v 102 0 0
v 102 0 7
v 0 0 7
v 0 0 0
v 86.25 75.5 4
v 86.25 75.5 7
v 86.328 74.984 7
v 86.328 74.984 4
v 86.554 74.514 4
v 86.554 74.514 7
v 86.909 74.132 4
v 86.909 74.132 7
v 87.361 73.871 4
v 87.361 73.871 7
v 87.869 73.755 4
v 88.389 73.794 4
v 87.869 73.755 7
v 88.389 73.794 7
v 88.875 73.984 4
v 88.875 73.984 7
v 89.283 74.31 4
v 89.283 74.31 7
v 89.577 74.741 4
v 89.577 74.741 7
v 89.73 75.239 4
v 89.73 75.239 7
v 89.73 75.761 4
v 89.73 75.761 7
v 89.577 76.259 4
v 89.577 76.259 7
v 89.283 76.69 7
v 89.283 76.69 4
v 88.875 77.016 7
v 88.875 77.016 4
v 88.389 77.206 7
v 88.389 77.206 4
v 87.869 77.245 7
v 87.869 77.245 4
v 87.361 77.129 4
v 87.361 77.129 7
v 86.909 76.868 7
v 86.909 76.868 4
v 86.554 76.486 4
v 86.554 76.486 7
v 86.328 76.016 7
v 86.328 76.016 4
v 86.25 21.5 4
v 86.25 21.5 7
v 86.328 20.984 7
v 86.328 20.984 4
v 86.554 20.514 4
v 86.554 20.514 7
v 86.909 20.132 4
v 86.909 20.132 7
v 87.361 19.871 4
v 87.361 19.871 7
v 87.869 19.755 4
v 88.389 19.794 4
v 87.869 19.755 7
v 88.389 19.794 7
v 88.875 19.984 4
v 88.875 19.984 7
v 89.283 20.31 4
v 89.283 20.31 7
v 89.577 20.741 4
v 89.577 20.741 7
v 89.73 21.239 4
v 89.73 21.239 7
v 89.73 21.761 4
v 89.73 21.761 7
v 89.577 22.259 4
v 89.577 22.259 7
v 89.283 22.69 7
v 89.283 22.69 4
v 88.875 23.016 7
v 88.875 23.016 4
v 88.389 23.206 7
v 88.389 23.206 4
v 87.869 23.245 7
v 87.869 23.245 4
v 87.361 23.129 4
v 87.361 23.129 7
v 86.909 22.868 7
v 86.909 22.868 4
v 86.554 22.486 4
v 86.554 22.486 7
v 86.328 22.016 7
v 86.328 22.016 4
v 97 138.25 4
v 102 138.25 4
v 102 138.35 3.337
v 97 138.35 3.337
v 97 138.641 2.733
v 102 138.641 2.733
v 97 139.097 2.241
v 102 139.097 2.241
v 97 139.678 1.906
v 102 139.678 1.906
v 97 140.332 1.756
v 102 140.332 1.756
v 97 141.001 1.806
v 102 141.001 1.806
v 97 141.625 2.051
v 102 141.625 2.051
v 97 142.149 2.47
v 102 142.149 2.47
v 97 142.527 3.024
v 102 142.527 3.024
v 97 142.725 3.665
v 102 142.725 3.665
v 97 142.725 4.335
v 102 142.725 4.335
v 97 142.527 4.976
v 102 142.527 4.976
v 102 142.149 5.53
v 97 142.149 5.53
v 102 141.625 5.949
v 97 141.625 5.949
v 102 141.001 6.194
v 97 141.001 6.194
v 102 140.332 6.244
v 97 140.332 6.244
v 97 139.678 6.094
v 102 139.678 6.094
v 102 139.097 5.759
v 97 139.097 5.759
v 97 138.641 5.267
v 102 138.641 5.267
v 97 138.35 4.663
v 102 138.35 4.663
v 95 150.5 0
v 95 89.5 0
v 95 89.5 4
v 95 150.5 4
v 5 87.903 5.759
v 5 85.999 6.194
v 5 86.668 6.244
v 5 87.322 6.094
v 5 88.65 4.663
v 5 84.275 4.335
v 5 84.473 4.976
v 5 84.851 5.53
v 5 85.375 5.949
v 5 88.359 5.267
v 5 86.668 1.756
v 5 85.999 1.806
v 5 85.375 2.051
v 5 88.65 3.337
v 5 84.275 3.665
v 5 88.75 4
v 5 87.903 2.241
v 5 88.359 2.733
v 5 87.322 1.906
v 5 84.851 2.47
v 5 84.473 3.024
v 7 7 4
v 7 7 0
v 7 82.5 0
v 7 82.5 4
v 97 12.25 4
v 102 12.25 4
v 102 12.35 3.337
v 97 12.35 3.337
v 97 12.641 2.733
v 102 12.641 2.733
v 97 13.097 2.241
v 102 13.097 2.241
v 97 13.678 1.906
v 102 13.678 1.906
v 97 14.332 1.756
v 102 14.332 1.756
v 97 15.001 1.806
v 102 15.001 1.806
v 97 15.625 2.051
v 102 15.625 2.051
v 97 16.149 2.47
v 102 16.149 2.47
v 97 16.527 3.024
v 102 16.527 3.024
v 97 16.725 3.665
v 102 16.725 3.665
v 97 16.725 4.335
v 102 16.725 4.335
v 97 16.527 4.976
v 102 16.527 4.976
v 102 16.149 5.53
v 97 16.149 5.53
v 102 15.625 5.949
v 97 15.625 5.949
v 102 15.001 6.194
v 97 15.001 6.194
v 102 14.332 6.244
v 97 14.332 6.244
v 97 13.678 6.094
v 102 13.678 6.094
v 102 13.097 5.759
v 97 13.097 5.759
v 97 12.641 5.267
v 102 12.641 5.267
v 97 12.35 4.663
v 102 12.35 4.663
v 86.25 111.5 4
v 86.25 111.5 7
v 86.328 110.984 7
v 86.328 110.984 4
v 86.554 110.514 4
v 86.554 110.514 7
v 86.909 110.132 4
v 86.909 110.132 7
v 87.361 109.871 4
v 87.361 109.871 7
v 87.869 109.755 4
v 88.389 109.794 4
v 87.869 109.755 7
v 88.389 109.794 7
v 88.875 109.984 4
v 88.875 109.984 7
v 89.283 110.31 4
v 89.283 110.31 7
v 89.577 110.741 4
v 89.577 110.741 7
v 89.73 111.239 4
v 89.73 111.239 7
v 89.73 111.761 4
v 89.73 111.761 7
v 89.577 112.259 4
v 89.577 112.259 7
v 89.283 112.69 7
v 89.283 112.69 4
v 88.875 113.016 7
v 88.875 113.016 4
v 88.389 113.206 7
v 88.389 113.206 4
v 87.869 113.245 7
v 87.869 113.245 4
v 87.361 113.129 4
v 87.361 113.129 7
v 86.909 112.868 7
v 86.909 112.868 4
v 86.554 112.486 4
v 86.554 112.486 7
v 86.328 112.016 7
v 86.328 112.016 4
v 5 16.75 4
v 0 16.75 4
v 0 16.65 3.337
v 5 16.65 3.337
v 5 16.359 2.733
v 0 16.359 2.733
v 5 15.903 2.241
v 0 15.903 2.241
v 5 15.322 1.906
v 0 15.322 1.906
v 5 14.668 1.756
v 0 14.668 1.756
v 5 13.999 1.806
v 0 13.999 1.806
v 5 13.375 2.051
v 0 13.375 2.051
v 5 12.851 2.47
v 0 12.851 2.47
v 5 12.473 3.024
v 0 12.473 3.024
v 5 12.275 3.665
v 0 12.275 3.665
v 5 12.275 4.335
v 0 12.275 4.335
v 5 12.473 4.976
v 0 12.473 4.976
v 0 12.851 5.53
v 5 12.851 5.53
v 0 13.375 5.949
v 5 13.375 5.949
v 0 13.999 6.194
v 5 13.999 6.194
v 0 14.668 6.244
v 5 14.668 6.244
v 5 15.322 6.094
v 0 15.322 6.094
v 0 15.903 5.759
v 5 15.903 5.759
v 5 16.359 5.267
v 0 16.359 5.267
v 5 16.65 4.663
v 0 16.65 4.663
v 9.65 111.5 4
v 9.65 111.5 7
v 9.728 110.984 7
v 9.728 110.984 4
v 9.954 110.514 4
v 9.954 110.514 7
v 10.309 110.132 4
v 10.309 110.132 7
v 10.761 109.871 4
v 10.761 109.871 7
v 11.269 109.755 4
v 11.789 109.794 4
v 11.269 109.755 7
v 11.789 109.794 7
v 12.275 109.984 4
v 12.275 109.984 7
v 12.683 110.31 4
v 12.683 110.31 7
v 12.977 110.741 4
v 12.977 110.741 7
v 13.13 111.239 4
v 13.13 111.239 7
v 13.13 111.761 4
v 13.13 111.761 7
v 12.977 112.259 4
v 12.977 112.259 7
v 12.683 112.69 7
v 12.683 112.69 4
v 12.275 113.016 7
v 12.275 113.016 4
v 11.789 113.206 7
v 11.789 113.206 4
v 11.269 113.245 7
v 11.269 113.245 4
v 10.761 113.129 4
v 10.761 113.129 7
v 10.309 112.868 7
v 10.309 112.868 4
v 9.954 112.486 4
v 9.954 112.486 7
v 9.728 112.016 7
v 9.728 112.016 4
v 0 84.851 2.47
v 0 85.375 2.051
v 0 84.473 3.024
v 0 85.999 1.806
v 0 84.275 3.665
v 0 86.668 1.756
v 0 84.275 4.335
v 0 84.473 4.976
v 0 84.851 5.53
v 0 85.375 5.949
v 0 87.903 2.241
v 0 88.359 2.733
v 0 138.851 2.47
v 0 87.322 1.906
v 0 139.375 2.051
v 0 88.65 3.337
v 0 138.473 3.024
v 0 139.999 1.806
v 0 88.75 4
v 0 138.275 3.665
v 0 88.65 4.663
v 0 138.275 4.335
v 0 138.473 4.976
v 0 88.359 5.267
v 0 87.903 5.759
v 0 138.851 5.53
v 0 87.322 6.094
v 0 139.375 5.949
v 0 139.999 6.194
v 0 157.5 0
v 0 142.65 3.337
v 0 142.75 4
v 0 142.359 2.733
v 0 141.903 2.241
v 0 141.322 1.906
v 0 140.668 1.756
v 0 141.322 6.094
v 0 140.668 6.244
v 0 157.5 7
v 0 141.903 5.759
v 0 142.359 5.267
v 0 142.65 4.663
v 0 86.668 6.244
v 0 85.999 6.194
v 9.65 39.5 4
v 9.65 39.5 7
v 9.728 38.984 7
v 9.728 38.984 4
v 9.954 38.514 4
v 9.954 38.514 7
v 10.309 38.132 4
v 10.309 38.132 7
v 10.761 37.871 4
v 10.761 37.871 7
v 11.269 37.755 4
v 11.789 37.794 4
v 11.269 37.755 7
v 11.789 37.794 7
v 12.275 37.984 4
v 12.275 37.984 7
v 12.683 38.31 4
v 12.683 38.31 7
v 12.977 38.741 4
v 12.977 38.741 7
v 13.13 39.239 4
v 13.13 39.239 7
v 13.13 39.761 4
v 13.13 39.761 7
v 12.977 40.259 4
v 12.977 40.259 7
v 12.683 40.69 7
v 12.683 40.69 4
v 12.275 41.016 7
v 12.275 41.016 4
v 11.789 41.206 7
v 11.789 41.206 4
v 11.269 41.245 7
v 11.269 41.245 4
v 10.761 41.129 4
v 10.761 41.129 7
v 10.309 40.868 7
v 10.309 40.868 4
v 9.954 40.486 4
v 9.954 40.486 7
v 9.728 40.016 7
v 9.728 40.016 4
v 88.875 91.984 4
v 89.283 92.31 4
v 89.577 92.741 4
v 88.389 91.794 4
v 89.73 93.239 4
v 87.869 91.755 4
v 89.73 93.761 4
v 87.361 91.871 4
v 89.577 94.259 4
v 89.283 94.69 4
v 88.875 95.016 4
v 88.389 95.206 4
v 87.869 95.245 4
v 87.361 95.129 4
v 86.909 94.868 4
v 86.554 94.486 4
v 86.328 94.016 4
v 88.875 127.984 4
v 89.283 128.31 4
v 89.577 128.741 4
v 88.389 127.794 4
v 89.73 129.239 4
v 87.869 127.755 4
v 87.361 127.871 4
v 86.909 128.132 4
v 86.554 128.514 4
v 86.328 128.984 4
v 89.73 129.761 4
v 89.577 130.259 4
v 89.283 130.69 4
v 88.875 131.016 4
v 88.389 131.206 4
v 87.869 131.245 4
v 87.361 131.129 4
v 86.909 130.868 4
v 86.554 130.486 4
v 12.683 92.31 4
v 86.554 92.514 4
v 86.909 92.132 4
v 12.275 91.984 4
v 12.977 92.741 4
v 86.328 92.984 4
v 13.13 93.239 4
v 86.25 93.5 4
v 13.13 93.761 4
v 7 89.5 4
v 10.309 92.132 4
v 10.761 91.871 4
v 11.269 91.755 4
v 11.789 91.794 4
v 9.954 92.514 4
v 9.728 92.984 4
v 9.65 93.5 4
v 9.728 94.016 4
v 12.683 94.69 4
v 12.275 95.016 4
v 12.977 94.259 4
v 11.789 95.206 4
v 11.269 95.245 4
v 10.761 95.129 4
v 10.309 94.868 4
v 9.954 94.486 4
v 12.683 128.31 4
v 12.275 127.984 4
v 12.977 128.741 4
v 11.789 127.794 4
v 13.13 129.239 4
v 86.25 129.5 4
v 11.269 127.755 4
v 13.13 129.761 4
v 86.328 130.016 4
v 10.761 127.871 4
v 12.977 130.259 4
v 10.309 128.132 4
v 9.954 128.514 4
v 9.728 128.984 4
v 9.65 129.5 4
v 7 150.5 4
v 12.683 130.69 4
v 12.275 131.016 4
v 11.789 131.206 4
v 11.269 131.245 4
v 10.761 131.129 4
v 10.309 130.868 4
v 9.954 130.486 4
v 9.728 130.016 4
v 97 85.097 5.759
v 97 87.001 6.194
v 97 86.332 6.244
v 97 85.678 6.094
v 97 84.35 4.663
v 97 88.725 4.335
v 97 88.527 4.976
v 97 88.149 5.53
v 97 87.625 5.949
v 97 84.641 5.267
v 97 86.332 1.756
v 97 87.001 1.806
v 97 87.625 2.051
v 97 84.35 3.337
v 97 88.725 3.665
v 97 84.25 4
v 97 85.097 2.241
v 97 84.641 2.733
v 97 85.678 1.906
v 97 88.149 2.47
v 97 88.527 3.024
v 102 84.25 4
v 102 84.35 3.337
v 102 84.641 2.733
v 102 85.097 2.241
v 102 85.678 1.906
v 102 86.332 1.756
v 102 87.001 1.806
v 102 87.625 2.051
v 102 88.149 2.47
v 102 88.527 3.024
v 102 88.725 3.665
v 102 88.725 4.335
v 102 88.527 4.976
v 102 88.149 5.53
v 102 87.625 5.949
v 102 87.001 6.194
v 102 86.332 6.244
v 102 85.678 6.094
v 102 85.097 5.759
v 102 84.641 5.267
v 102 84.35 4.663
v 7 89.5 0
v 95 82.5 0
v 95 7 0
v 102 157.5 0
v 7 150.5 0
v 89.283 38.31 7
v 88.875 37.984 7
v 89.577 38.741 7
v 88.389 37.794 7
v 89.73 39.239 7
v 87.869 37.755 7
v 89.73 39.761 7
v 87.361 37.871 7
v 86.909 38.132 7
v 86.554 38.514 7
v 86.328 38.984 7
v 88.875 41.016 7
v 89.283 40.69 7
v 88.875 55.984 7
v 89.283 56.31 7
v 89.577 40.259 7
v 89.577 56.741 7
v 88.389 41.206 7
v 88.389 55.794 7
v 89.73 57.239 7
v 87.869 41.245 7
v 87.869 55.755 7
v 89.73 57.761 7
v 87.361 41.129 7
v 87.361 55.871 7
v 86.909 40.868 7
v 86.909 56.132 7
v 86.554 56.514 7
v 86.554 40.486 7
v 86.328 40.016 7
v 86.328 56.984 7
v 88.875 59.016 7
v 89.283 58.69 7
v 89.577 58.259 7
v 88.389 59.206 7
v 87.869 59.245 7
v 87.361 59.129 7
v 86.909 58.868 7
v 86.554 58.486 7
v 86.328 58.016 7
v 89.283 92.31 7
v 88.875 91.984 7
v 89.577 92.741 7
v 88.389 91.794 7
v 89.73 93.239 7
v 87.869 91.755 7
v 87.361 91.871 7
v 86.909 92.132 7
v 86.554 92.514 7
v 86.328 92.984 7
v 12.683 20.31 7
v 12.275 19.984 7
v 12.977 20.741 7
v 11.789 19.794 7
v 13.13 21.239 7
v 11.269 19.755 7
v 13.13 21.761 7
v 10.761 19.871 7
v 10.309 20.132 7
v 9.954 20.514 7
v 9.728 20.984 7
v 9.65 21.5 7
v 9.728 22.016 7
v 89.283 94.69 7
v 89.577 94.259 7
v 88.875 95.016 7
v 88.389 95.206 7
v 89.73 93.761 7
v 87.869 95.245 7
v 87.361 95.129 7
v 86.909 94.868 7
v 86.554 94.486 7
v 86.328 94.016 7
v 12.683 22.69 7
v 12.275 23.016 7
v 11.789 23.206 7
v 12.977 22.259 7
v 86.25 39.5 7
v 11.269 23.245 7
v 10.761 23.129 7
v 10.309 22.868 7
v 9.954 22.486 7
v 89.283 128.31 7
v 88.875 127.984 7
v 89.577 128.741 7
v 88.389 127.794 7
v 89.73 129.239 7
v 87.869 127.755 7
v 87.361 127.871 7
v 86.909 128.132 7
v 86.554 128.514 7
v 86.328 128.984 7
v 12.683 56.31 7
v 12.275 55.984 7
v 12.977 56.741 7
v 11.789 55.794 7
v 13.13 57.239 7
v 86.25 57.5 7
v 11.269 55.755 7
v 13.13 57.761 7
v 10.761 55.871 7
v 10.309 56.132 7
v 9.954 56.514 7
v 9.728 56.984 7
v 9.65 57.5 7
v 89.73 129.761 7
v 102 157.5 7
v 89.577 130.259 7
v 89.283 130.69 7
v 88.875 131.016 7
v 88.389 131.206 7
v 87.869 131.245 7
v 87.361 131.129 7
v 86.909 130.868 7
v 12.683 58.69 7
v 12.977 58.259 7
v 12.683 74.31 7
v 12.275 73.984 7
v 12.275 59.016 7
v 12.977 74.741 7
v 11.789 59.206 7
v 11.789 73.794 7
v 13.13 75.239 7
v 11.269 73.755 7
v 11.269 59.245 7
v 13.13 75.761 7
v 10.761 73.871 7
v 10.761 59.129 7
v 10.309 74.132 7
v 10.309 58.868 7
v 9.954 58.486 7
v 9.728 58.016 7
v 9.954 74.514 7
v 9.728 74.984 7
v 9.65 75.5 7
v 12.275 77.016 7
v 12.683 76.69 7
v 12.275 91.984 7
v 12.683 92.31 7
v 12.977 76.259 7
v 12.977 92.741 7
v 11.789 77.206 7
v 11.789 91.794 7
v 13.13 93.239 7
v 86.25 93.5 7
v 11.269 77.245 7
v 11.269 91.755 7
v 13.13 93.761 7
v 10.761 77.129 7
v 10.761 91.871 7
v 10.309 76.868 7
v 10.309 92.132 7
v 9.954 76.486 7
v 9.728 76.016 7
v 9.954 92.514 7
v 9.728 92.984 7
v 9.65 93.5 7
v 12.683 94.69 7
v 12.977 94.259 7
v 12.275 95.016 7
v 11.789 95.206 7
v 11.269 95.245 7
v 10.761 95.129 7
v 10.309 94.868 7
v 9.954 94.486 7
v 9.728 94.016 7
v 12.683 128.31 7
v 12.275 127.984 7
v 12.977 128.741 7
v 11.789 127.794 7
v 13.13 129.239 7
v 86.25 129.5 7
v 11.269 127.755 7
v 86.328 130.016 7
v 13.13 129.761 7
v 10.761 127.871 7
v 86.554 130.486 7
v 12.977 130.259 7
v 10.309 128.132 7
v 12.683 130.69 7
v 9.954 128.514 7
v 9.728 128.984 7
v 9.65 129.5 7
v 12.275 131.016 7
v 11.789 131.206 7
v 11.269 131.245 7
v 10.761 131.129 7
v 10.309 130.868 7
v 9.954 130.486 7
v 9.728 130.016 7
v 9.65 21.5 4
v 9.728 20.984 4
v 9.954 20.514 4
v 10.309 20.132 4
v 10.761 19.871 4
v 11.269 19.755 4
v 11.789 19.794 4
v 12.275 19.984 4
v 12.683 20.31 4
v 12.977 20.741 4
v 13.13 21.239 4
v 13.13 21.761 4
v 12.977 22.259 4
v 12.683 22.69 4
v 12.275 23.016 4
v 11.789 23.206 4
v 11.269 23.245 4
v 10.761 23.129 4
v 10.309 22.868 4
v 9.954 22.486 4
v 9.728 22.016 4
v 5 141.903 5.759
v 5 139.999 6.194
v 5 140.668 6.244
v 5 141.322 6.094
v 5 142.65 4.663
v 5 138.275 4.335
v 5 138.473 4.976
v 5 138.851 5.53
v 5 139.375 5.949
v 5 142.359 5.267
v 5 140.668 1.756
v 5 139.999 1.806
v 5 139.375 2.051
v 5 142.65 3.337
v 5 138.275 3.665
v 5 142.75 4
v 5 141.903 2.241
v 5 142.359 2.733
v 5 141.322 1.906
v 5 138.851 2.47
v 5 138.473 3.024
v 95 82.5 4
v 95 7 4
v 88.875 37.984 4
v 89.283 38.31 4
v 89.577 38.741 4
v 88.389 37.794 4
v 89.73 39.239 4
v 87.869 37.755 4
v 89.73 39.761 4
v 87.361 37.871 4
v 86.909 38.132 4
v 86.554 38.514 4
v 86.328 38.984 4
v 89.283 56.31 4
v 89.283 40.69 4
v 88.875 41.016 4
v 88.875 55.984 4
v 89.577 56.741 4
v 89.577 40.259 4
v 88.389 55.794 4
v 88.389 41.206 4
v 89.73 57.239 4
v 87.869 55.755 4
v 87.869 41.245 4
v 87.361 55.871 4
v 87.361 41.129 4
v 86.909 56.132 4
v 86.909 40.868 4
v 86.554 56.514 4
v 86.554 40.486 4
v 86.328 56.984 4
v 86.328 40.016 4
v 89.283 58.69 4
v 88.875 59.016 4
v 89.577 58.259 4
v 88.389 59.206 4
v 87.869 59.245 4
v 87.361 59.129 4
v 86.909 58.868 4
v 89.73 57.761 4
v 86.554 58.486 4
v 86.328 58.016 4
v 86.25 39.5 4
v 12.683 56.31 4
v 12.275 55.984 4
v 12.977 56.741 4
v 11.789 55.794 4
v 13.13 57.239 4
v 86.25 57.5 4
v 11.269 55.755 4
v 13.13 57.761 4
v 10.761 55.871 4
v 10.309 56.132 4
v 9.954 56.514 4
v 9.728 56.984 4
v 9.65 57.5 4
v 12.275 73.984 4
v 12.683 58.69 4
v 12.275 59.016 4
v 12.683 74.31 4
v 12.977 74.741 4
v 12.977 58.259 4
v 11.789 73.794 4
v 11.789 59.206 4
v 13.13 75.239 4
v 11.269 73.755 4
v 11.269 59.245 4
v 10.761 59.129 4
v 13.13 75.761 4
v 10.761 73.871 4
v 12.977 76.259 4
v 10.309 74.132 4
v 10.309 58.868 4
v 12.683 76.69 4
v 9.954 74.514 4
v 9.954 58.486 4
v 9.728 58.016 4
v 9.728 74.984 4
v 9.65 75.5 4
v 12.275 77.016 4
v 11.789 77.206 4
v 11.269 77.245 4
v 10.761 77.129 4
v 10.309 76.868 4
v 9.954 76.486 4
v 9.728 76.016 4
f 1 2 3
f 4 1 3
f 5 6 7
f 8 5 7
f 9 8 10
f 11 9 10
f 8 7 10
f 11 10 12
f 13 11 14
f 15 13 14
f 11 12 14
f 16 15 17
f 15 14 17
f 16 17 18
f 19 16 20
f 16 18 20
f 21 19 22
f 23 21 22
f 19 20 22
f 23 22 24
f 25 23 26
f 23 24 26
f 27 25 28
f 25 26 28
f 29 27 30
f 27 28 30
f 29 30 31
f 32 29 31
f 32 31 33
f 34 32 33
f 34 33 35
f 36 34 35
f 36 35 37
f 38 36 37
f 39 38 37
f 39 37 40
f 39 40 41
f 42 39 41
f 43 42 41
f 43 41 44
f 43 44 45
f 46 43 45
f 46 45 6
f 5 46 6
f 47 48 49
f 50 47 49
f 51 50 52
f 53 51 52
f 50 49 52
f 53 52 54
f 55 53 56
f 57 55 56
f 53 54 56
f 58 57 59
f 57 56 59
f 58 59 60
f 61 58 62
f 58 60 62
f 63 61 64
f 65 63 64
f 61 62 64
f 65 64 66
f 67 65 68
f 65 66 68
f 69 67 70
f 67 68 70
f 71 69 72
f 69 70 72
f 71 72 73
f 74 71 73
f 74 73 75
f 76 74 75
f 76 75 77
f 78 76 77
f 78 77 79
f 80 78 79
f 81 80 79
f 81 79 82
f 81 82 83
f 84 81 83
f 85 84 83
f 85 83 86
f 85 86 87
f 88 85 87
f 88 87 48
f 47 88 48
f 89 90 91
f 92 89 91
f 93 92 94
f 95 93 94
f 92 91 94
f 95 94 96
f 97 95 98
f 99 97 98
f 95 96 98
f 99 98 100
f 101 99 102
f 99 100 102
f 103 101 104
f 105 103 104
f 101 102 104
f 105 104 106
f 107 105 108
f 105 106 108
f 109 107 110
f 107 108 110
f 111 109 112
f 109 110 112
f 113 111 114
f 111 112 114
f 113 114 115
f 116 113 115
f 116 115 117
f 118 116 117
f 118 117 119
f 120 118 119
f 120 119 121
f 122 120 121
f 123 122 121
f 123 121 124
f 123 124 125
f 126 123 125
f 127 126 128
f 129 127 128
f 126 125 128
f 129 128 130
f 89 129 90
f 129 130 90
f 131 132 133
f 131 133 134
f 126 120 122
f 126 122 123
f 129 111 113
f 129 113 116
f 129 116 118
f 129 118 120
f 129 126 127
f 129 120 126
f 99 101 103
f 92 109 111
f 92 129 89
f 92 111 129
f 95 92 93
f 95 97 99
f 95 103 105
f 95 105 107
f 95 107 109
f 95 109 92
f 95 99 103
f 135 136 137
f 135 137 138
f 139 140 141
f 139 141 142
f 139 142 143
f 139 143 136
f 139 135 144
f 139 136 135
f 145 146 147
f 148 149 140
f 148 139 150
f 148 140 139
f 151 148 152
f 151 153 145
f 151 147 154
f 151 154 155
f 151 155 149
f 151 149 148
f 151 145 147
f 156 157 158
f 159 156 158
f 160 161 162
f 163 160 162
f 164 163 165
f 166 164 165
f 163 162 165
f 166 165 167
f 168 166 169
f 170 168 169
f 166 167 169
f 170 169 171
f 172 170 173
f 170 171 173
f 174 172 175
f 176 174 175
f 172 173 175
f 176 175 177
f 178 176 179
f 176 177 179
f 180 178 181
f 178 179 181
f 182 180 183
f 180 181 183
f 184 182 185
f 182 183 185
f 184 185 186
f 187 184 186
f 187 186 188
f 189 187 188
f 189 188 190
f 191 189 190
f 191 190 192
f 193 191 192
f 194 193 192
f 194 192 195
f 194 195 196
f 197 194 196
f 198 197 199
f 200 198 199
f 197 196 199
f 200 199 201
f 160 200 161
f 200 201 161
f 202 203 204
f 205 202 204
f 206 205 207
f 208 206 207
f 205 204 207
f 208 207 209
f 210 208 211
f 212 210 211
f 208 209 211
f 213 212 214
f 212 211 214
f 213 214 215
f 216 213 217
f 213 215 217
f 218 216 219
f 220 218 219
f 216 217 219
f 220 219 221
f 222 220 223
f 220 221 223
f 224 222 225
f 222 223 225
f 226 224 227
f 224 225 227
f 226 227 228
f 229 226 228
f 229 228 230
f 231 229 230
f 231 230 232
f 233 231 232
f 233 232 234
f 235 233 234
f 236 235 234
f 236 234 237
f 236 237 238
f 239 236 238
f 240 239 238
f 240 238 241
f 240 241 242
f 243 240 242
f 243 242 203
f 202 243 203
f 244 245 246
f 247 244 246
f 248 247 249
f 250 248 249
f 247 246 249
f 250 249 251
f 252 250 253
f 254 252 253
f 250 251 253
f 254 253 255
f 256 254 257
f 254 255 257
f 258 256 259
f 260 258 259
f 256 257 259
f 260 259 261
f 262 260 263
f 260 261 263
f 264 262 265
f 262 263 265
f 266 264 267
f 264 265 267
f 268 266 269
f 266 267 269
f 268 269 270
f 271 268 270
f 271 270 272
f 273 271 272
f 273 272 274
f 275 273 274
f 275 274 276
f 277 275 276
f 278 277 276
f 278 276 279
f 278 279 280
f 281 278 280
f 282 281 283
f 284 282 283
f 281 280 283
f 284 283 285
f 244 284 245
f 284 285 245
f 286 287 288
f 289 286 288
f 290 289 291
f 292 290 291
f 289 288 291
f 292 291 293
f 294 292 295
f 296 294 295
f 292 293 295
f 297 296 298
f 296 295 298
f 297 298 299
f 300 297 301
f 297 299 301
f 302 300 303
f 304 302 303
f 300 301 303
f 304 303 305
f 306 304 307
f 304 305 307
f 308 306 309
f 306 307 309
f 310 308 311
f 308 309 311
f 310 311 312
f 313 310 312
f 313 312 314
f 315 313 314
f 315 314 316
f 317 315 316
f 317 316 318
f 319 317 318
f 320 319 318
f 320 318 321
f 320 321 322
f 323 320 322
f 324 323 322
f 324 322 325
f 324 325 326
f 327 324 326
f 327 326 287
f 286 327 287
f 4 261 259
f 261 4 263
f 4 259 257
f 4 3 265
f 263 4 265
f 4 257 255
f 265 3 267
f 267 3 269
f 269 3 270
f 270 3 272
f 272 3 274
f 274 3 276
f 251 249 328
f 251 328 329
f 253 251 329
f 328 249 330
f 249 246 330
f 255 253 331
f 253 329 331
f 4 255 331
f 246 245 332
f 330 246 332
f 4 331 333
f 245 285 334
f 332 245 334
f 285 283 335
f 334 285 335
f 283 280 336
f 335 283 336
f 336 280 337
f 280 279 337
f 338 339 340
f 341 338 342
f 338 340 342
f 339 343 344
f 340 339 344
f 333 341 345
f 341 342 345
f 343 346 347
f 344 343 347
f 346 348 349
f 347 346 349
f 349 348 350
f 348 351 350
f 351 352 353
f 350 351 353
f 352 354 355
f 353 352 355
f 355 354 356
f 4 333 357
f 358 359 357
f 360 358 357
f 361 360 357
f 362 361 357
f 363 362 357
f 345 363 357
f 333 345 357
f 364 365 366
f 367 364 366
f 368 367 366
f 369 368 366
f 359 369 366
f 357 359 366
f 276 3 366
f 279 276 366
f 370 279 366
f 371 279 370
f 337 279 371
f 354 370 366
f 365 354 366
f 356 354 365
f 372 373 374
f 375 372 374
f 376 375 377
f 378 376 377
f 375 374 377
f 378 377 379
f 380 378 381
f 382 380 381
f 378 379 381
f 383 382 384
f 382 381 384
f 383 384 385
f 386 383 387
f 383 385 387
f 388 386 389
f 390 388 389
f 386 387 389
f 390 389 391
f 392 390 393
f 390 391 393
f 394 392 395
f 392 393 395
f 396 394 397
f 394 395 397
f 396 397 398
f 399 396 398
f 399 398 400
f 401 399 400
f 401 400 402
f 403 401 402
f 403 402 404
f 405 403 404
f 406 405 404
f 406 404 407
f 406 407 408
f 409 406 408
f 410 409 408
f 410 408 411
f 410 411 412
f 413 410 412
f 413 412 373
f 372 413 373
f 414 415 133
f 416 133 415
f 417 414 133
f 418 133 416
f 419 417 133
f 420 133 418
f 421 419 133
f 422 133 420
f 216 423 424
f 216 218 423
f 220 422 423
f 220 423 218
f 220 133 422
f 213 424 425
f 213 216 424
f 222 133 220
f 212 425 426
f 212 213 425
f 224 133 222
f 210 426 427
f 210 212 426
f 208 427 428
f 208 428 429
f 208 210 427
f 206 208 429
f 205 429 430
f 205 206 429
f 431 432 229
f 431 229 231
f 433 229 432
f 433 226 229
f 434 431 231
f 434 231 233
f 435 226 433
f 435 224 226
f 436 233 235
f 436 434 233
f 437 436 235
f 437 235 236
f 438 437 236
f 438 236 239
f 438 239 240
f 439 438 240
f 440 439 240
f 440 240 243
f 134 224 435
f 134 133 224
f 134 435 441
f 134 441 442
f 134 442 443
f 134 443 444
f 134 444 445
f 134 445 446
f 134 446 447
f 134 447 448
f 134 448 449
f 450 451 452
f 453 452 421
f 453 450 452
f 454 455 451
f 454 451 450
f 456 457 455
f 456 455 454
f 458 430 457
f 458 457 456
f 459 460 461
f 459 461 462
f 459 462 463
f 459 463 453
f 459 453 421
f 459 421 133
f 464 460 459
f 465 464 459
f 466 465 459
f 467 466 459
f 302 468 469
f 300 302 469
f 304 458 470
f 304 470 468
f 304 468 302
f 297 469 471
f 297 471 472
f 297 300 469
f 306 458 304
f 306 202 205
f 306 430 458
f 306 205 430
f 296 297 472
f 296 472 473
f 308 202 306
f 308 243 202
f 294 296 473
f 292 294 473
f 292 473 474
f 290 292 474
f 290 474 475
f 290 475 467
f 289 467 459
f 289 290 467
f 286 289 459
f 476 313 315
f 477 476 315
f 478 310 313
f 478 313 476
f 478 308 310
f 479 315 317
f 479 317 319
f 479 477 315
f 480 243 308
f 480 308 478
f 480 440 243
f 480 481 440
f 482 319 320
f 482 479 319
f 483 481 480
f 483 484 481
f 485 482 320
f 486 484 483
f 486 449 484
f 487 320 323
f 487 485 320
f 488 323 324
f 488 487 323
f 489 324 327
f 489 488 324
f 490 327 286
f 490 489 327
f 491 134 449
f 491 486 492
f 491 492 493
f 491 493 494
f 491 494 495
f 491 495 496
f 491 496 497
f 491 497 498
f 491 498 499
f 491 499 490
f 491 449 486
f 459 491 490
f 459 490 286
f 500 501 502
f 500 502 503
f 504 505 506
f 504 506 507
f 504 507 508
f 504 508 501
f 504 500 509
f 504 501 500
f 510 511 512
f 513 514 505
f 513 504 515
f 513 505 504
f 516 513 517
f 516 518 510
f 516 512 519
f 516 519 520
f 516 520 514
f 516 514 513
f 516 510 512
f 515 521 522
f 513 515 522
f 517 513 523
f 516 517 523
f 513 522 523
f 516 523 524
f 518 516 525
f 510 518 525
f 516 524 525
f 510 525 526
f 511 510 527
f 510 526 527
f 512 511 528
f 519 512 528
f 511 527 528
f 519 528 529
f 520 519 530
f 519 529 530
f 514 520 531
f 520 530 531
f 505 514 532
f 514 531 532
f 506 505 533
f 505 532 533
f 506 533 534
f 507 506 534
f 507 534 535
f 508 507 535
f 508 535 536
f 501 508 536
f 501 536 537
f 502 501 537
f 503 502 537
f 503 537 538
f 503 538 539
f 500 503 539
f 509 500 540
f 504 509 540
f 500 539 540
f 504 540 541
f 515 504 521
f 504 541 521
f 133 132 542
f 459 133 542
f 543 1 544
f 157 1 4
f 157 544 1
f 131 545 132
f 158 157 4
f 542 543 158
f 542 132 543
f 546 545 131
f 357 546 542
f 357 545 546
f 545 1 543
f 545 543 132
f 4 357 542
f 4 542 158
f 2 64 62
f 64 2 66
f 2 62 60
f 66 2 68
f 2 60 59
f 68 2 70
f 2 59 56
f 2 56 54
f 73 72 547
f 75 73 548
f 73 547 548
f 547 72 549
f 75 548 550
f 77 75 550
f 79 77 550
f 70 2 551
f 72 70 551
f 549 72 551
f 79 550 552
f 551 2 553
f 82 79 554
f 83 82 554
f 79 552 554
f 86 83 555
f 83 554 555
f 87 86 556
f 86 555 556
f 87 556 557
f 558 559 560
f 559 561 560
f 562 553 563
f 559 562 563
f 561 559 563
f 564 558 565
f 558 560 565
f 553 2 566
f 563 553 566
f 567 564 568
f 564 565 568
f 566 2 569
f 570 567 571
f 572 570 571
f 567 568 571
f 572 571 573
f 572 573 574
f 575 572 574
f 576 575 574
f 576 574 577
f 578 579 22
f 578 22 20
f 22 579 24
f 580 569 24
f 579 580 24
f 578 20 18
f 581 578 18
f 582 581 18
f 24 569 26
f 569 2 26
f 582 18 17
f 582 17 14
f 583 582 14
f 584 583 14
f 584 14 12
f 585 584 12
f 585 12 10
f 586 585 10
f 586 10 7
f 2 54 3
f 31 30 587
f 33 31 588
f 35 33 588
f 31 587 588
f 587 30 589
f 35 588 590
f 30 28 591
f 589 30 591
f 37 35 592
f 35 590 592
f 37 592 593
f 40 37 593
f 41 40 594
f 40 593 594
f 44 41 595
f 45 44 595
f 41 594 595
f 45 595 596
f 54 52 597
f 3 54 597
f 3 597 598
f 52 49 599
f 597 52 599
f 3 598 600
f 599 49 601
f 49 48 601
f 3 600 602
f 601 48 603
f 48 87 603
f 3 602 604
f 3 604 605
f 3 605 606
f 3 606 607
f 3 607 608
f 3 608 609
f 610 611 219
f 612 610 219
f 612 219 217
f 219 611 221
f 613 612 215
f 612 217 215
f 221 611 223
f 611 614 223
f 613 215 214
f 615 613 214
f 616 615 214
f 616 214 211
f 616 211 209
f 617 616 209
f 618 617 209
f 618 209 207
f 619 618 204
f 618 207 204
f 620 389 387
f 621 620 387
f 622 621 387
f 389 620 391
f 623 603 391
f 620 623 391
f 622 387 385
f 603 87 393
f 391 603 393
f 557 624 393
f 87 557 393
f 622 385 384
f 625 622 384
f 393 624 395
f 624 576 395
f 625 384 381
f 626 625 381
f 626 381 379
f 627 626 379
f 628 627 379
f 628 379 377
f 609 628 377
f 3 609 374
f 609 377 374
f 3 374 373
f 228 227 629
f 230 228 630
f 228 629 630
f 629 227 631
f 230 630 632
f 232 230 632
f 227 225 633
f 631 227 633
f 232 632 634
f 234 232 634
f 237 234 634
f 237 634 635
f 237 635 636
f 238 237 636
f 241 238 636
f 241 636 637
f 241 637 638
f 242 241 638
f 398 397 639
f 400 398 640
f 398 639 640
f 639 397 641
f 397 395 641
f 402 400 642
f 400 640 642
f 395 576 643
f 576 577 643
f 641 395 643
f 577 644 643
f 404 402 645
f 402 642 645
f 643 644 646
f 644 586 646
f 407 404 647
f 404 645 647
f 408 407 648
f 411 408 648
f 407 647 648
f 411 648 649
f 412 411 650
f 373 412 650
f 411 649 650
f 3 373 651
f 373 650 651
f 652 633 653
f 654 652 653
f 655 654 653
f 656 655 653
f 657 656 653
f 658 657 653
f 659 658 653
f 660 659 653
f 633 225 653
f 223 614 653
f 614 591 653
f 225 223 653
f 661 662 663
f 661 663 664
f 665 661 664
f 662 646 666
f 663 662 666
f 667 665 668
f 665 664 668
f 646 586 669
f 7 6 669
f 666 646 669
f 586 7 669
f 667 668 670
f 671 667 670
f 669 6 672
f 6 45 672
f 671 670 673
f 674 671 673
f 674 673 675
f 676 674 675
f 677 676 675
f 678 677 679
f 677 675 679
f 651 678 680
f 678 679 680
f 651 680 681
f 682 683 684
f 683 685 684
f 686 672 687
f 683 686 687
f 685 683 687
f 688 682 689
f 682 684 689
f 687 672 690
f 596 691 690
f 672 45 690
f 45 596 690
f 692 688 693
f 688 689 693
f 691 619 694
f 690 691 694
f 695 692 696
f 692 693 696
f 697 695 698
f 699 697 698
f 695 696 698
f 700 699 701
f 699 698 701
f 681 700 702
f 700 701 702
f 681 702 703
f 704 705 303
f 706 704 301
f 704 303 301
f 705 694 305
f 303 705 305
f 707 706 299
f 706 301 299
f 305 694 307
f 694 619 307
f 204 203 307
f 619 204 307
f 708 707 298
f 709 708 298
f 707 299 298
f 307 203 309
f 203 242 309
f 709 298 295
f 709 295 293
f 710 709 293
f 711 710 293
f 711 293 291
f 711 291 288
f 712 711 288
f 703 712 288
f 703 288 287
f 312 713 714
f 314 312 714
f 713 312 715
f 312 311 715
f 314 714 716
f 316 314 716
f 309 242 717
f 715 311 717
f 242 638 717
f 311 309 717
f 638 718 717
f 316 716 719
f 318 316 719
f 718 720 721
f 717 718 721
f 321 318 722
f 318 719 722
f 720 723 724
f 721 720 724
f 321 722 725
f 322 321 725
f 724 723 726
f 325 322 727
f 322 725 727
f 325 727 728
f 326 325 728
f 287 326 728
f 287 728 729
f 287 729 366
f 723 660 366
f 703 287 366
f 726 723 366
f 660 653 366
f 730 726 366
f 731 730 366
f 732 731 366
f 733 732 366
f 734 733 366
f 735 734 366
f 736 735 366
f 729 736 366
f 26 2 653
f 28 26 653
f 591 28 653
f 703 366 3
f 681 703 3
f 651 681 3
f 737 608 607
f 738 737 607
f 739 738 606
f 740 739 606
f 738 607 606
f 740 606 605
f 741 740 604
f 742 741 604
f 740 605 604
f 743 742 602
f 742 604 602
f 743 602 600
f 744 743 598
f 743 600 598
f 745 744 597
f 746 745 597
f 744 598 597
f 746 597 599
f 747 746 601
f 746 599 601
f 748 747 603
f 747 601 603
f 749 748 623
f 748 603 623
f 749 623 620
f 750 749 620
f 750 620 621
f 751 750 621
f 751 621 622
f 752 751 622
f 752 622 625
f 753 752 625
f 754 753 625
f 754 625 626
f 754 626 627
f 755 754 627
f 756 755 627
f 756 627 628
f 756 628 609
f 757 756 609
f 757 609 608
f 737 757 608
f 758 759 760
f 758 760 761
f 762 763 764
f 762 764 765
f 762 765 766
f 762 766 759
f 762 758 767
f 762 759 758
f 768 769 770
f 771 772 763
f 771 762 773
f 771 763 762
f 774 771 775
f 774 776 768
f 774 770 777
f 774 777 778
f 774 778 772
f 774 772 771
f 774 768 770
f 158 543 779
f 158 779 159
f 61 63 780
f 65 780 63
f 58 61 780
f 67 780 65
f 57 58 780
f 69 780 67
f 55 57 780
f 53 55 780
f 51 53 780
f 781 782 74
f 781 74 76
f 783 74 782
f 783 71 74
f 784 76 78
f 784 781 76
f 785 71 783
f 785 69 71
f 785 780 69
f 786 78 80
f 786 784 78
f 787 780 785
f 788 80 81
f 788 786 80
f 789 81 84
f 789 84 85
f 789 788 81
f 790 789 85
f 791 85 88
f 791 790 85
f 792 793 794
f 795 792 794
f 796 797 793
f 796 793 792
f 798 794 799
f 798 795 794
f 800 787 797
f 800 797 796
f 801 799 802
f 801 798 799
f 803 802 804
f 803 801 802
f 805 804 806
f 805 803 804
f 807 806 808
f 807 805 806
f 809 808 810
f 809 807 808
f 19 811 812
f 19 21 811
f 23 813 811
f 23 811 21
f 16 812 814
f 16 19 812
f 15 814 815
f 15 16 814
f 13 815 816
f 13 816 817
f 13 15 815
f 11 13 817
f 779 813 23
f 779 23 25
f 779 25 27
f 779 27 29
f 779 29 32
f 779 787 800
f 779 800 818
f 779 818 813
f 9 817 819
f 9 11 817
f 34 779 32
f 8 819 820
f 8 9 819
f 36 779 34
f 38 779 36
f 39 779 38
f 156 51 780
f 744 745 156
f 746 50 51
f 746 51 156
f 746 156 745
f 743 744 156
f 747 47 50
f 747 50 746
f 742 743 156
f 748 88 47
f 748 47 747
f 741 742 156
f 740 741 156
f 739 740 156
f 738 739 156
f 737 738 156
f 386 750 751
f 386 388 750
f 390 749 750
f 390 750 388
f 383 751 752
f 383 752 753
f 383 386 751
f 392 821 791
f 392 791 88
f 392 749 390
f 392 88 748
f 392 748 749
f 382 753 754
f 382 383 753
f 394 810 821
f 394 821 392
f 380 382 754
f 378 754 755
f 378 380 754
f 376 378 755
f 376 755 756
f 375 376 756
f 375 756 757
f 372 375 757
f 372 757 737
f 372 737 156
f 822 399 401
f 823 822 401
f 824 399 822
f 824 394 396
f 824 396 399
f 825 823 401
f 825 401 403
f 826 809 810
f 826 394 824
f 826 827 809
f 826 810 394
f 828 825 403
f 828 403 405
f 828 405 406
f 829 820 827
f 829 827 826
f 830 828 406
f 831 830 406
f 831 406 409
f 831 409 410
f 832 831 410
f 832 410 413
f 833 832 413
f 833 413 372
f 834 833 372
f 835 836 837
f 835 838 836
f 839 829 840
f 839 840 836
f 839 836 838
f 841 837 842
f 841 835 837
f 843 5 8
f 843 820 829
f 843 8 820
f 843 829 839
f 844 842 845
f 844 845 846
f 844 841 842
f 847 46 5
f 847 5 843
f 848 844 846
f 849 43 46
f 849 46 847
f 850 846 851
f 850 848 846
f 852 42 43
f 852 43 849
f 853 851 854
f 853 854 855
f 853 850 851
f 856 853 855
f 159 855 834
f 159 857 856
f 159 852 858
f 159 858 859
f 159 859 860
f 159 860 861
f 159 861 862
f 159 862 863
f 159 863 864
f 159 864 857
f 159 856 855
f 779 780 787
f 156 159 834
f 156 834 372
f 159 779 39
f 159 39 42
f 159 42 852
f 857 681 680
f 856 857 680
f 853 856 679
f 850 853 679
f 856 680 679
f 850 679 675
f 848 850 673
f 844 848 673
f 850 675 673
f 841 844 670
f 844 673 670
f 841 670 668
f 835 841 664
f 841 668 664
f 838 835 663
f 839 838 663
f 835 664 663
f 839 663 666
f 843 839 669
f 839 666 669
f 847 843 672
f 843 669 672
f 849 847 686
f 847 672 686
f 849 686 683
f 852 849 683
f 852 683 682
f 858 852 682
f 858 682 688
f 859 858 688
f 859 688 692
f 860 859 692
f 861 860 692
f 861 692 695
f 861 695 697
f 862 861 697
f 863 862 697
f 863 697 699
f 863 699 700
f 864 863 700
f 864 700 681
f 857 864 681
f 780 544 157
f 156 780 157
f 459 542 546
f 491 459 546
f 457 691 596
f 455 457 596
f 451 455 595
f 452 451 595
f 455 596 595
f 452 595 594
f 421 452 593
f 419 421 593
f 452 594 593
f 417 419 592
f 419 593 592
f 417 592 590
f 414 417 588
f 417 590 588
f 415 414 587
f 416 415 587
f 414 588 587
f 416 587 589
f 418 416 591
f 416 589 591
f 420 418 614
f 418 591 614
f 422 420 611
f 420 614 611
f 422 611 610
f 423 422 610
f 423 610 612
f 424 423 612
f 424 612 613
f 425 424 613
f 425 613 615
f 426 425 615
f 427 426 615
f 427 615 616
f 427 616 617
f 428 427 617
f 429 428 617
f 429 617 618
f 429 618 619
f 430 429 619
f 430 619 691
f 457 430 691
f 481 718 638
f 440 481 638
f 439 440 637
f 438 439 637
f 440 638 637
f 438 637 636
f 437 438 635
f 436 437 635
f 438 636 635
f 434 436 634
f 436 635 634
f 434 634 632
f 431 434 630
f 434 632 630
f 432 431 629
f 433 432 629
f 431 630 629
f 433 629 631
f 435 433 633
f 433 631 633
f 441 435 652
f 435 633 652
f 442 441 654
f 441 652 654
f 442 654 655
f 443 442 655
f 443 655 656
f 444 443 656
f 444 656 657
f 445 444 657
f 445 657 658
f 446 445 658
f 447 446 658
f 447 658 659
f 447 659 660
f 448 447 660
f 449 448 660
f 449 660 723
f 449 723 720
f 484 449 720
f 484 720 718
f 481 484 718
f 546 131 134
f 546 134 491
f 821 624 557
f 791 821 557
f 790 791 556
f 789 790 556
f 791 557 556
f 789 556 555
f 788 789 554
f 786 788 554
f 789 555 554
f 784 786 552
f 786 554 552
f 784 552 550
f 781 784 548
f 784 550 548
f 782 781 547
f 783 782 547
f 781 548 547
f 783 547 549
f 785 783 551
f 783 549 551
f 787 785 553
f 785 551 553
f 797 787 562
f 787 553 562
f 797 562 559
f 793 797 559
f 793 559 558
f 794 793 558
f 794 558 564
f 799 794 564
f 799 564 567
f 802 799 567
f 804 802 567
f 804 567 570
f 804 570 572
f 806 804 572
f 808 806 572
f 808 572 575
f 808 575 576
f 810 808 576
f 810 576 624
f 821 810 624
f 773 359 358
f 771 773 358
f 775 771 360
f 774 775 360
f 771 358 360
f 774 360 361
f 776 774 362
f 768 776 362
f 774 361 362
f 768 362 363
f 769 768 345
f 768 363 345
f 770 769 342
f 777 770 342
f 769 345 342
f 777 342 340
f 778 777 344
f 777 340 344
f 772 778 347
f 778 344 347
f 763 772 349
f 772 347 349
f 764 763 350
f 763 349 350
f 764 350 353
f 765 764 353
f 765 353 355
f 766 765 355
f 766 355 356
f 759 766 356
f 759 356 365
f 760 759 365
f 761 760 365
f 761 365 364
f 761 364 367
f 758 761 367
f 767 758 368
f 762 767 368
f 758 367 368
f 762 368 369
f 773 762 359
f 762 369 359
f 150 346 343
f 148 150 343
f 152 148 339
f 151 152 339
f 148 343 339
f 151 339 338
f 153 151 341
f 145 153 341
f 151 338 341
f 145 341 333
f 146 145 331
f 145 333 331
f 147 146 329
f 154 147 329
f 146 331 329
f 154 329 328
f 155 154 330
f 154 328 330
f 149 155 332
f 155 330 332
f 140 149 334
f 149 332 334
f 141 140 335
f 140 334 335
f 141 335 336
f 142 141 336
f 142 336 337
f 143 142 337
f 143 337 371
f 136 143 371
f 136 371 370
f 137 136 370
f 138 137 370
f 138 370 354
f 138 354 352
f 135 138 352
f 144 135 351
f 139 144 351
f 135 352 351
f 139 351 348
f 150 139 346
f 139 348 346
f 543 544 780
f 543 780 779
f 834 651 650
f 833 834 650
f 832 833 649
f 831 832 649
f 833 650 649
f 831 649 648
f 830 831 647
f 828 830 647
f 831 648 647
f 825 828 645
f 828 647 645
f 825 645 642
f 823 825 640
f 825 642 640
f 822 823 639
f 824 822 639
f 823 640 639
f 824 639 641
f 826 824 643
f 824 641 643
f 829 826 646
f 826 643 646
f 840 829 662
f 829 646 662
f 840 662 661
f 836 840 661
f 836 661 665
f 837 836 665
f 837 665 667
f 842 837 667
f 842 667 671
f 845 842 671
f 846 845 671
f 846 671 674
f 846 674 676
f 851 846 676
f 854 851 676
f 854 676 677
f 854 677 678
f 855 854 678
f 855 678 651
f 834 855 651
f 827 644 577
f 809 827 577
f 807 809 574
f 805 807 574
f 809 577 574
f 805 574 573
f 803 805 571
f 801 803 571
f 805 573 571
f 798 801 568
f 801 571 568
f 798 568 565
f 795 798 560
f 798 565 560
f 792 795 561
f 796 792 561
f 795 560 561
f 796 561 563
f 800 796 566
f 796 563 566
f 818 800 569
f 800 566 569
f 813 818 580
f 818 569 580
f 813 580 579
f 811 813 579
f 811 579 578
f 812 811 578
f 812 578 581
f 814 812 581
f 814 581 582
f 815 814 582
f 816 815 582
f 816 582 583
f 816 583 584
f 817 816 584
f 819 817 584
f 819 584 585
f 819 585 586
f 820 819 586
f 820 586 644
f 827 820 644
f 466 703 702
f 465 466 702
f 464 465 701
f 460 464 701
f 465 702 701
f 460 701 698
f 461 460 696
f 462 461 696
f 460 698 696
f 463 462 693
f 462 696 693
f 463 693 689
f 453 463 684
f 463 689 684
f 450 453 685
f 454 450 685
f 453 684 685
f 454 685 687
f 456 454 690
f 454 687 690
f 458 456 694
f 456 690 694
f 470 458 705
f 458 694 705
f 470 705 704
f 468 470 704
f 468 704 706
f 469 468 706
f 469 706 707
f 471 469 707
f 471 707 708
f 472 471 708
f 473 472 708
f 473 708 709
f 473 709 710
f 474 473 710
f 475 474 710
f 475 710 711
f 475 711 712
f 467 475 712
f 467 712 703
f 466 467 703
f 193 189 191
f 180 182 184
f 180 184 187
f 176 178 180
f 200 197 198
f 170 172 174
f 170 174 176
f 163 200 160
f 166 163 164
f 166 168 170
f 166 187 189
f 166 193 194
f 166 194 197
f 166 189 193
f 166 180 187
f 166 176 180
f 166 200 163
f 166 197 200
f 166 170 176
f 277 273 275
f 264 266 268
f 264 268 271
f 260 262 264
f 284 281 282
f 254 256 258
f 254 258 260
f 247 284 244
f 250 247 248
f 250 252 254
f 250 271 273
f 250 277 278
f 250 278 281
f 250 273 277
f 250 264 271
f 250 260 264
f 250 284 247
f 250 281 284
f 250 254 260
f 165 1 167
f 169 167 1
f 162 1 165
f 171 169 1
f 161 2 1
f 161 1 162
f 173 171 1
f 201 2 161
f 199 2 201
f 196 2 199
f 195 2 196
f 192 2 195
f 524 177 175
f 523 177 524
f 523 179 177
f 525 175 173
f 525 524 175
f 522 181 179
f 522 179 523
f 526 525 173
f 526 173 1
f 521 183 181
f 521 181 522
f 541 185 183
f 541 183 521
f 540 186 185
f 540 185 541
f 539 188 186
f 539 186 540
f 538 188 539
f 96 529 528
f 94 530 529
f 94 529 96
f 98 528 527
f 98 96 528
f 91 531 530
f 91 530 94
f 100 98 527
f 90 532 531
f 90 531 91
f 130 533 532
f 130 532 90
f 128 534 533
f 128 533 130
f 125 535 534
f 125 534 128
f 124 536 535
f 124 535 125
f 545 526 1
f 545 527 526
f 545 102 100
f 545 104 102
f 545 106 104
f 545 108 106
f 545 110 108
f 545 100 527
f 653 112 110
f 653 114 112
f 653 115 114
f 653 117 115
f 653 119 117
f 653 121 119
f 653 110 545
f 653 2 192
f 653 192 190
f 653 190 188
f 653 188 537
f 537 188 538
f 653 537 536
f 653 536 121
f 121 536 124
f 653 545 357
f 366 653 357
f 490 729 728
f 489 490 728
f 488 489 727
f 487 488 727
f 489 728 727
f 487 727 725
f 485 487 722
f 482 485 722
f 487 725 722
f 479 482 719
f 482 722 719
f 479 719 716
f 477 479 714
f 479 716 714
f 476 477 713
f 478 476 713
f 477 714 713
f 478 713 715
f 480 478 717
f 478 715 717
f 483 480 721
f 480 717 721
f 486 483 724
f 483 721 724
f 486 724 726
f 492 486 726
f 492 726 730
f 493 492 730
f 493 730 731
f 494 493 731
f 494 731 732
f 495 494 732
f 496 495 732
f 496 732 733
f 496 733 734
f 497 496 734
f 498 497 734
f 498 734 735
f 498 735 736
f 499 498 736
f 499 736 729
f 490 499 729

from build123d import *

# Parameters (mm, degrees)
SKETCH042_W             = 102
SKETCH042_H             = 175
PAD011_DEPTH            = 7
SKETCH043_R             = 1.75
POCKET027_DEPTH         = 7.001
SKETCH044_R             = 2.25
POCKET028_DEPTH         = 5
SKETCH045_R             = 2.25
POCKET029_DEPTH         = 5
SKETCH046_W             = 88
SKETCH046_H             = 61
SKETCH046_H_2           = 75.5
POCKET030_DEPTH         = 4
SKETCH047_W             = 186.33641
SKETCH047_H             = 47.448593
POCKET031_DEPTH         = 7.001
BODY010_PLACEMENT_ANGLE = 180


with BuildPart() as part:
    # Sketch042 → Pad011 (new body)
    with BuildSketch(Plane.XY):
        with Locations((51, 87.5)):
            Rectangle(SKETCH042_W, SKETCH042_H)
    extrude(amount=PAD011_DEPTH)

    # Sketch043 (on Face5 of Pad011) → Pocket027 (cut, through all)
    with BuildSketch(Plane(origin=(0, 0, 0), x_dir=(1, 0, 0), z_dir=(0, 0, -1))):
        with Locations((90.6, -129.5)):
            Circle(SKETCH043_R)
        with Locations((14, -129.5)):
            Circle(SKETCH043_R)
        with Locations((90.6, -111.5)):
            Circle(SKETCH043_R)
        with Locations((14, -111.5)):
            Circle(SKETCH043_R)
        with Locations((90.6, -93.5)):
            Circle(SKETCH043_R)
        with Locations((14, -93.5)):
            Circle(SKETCH043_R)
        with Locations((14, -75.5)):
            Circle(SKETCH043_R)
        with Locations((90.6, -75.5)):
            Circle(SKETCH043_R)
        with Locations((90.6, -57.5)):
            Circle(SKETCH043_R)
        with Locations((90.6, -39.5)):
            Circle(SKETCH043_R)
        with Locations((14, -39.5)):
            Circle(SKETCH043_R)
        with Locations((14, -21.5)):
            Circle(SKETCH043_R)
        with Locations((90.6, -21.5)):
            Circle(SKETCH043_R)
        with Locations((14, -57.5)):
            Circle(SKETCH043_R)
    extrude(amount=-POCKET027_DEPTH, mode=Mode.SUBTRACT)

    # Sketch044 (on Face1 of Pocket027) → Pocket028 (cut)
    with BuildSketch(Plane(origin=(0, 0, 0), x_dir=(0, -1, 0), z_dir=(-1, 0, 0))):
        with Locations((-14.5, 3)):
            Circle(SKETCH044_R)
        with Locations((-86.5, 3)):
            Circle(SKETCH044_R)
        with Locations((-140.5, 3)):
            Circle(SKETCH044_R)
    extrude(amount=-POCKET028_DEPTH, mode=Mode.SUBTRACT)

    # Sketch045 (on Face9 of Pocket028) → Pocket029 (cut)
    with BuildSketch(Plane.YZ.offset(102)):
        with Locations((14.5, 3)):
            Circle(SKETCH045_R)
        with Locations((86.5, 3)):
            Circle(SKETCH045_R)
        with Locations((140.5, 3)):
            Circle(SKETCH045_R)
    extrude(amount=-POCKET029_DEPTH, mode=Mode.SUBTRACT)

    # Sketch046 (on Face4 of Pocket029) → Pocket030 (cut)
    with BuildSketch(Plane.XY.offset(7)):
        with Locations((51, 120)):
            Rectangle(SKETCH046_W, SKETCH046_H)
        with Locations((51, 44.75)):
            Rectangle(SKETCH046_W, SKETCH046_H_2)
    extrude(amount=-POCKET030_DEPTH, mode=Mode.SUBTRACT)

    # Sketch047 (on Face4 of Pocket030) → Pocket031 (cut, through all)
    with BuildSketch(Plane.XY.offset(7)):
        with Locations((50.088417, 181.224296)):
            Rectangle(SKETCH047_W, SKETCH047_H)
    extrude(amount=-POCKET031_DEPTH, mode=Mode.SUBTRACT)


with BuildPart() as part_1:
    # Body010 placement: moved
    add(part.part.moved(Location((102, 0, 7))).rotate(Axis((102, 0, 7), (0, 1, 0)), BODY010_PLACEMENT_ANGLE))


solid = part_1.part
